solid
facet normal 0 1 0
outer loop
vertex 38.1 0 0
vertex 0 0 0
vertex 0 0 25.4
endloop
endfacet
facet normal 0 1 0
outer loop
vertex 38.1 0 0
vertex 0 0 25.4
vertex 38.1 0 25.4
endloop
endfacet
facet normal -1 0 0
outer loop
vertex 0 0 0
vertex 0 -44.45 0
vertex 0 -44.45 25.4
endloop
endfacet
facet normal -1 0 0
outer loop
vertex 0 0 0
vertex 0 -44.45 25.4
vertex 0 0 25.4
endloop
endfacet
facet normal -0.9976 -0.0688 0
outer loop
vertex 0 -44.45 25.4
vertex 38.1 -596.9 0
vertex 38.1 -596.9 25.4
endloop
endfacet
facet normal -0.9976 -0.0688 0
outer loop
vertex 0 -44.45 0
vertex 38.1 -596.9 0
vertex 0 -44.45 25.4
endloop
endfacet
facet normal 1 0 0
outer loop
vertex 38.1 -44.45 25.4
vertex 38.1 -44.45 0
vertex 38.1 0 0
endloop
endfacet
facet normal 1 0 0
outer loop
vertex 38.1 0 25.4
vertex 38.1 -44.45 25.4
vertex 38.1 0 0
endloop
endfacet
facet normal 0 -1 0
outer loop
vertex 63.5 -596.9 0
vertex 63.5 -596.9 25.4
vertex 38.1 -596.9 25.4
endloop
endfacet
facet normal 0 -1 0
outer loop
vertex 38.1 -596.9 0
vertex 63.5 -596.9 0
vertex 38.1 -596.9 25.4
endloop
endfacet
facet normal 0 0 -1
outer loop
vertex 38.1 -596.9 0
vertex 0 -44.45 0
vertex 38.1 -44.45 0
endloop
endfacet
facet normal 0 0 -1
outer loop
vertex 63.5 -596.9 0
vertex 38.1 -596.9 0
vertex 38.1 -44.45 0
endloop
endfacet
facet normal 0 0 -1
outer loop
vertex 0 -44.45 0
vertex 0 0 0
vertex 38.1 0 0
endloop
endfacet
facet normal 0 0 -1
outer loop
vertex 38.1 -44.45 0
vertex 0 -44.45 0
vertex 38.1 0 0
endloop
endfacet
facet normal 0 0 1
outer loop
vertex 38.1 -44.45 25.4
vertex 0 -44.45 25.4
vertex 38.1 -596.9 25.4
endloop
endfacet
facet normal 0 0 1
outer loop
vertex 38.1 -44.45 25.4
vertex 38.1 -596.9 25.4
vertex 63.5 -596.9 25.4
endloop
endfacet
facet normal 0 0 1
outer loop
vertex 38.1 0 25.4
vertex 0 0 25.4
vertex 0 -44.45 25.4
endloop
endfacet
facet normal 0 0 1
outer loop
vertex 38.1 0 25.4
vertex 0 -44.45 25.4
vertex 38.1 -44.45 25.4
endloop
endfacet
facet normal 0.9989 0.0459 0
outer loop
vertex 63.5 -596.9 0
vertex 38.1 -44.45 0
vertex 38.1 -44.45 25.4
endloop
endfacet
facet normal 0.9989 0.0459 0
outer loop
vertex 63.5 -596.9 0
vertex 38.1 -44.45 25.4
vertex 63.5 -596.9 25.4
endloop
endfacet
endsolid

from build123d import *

# Parameters (mm, degrees)
SKETCH1_W           = 38.1
SKETCH1_H           = 44.45
BOSS_EXTRUDE1_DEPTH = 25.4


with BuildPart() as part:
    # Sketch1 → Boss-Extrude1 (new body)
    with BuildSketch(Plane.XY):
        with Locations((19.05, -22.225)):
            Rectangle(SKETCH1_W, SKETCH1_H)
        Polygon((38.1, -596.9), (0, -44.45), (38.1, -44.45), (63.5, -596.9), align=None)
    extrude(amount=BOSS_EXTRUDE1_DEPTH)


solid = part.part
